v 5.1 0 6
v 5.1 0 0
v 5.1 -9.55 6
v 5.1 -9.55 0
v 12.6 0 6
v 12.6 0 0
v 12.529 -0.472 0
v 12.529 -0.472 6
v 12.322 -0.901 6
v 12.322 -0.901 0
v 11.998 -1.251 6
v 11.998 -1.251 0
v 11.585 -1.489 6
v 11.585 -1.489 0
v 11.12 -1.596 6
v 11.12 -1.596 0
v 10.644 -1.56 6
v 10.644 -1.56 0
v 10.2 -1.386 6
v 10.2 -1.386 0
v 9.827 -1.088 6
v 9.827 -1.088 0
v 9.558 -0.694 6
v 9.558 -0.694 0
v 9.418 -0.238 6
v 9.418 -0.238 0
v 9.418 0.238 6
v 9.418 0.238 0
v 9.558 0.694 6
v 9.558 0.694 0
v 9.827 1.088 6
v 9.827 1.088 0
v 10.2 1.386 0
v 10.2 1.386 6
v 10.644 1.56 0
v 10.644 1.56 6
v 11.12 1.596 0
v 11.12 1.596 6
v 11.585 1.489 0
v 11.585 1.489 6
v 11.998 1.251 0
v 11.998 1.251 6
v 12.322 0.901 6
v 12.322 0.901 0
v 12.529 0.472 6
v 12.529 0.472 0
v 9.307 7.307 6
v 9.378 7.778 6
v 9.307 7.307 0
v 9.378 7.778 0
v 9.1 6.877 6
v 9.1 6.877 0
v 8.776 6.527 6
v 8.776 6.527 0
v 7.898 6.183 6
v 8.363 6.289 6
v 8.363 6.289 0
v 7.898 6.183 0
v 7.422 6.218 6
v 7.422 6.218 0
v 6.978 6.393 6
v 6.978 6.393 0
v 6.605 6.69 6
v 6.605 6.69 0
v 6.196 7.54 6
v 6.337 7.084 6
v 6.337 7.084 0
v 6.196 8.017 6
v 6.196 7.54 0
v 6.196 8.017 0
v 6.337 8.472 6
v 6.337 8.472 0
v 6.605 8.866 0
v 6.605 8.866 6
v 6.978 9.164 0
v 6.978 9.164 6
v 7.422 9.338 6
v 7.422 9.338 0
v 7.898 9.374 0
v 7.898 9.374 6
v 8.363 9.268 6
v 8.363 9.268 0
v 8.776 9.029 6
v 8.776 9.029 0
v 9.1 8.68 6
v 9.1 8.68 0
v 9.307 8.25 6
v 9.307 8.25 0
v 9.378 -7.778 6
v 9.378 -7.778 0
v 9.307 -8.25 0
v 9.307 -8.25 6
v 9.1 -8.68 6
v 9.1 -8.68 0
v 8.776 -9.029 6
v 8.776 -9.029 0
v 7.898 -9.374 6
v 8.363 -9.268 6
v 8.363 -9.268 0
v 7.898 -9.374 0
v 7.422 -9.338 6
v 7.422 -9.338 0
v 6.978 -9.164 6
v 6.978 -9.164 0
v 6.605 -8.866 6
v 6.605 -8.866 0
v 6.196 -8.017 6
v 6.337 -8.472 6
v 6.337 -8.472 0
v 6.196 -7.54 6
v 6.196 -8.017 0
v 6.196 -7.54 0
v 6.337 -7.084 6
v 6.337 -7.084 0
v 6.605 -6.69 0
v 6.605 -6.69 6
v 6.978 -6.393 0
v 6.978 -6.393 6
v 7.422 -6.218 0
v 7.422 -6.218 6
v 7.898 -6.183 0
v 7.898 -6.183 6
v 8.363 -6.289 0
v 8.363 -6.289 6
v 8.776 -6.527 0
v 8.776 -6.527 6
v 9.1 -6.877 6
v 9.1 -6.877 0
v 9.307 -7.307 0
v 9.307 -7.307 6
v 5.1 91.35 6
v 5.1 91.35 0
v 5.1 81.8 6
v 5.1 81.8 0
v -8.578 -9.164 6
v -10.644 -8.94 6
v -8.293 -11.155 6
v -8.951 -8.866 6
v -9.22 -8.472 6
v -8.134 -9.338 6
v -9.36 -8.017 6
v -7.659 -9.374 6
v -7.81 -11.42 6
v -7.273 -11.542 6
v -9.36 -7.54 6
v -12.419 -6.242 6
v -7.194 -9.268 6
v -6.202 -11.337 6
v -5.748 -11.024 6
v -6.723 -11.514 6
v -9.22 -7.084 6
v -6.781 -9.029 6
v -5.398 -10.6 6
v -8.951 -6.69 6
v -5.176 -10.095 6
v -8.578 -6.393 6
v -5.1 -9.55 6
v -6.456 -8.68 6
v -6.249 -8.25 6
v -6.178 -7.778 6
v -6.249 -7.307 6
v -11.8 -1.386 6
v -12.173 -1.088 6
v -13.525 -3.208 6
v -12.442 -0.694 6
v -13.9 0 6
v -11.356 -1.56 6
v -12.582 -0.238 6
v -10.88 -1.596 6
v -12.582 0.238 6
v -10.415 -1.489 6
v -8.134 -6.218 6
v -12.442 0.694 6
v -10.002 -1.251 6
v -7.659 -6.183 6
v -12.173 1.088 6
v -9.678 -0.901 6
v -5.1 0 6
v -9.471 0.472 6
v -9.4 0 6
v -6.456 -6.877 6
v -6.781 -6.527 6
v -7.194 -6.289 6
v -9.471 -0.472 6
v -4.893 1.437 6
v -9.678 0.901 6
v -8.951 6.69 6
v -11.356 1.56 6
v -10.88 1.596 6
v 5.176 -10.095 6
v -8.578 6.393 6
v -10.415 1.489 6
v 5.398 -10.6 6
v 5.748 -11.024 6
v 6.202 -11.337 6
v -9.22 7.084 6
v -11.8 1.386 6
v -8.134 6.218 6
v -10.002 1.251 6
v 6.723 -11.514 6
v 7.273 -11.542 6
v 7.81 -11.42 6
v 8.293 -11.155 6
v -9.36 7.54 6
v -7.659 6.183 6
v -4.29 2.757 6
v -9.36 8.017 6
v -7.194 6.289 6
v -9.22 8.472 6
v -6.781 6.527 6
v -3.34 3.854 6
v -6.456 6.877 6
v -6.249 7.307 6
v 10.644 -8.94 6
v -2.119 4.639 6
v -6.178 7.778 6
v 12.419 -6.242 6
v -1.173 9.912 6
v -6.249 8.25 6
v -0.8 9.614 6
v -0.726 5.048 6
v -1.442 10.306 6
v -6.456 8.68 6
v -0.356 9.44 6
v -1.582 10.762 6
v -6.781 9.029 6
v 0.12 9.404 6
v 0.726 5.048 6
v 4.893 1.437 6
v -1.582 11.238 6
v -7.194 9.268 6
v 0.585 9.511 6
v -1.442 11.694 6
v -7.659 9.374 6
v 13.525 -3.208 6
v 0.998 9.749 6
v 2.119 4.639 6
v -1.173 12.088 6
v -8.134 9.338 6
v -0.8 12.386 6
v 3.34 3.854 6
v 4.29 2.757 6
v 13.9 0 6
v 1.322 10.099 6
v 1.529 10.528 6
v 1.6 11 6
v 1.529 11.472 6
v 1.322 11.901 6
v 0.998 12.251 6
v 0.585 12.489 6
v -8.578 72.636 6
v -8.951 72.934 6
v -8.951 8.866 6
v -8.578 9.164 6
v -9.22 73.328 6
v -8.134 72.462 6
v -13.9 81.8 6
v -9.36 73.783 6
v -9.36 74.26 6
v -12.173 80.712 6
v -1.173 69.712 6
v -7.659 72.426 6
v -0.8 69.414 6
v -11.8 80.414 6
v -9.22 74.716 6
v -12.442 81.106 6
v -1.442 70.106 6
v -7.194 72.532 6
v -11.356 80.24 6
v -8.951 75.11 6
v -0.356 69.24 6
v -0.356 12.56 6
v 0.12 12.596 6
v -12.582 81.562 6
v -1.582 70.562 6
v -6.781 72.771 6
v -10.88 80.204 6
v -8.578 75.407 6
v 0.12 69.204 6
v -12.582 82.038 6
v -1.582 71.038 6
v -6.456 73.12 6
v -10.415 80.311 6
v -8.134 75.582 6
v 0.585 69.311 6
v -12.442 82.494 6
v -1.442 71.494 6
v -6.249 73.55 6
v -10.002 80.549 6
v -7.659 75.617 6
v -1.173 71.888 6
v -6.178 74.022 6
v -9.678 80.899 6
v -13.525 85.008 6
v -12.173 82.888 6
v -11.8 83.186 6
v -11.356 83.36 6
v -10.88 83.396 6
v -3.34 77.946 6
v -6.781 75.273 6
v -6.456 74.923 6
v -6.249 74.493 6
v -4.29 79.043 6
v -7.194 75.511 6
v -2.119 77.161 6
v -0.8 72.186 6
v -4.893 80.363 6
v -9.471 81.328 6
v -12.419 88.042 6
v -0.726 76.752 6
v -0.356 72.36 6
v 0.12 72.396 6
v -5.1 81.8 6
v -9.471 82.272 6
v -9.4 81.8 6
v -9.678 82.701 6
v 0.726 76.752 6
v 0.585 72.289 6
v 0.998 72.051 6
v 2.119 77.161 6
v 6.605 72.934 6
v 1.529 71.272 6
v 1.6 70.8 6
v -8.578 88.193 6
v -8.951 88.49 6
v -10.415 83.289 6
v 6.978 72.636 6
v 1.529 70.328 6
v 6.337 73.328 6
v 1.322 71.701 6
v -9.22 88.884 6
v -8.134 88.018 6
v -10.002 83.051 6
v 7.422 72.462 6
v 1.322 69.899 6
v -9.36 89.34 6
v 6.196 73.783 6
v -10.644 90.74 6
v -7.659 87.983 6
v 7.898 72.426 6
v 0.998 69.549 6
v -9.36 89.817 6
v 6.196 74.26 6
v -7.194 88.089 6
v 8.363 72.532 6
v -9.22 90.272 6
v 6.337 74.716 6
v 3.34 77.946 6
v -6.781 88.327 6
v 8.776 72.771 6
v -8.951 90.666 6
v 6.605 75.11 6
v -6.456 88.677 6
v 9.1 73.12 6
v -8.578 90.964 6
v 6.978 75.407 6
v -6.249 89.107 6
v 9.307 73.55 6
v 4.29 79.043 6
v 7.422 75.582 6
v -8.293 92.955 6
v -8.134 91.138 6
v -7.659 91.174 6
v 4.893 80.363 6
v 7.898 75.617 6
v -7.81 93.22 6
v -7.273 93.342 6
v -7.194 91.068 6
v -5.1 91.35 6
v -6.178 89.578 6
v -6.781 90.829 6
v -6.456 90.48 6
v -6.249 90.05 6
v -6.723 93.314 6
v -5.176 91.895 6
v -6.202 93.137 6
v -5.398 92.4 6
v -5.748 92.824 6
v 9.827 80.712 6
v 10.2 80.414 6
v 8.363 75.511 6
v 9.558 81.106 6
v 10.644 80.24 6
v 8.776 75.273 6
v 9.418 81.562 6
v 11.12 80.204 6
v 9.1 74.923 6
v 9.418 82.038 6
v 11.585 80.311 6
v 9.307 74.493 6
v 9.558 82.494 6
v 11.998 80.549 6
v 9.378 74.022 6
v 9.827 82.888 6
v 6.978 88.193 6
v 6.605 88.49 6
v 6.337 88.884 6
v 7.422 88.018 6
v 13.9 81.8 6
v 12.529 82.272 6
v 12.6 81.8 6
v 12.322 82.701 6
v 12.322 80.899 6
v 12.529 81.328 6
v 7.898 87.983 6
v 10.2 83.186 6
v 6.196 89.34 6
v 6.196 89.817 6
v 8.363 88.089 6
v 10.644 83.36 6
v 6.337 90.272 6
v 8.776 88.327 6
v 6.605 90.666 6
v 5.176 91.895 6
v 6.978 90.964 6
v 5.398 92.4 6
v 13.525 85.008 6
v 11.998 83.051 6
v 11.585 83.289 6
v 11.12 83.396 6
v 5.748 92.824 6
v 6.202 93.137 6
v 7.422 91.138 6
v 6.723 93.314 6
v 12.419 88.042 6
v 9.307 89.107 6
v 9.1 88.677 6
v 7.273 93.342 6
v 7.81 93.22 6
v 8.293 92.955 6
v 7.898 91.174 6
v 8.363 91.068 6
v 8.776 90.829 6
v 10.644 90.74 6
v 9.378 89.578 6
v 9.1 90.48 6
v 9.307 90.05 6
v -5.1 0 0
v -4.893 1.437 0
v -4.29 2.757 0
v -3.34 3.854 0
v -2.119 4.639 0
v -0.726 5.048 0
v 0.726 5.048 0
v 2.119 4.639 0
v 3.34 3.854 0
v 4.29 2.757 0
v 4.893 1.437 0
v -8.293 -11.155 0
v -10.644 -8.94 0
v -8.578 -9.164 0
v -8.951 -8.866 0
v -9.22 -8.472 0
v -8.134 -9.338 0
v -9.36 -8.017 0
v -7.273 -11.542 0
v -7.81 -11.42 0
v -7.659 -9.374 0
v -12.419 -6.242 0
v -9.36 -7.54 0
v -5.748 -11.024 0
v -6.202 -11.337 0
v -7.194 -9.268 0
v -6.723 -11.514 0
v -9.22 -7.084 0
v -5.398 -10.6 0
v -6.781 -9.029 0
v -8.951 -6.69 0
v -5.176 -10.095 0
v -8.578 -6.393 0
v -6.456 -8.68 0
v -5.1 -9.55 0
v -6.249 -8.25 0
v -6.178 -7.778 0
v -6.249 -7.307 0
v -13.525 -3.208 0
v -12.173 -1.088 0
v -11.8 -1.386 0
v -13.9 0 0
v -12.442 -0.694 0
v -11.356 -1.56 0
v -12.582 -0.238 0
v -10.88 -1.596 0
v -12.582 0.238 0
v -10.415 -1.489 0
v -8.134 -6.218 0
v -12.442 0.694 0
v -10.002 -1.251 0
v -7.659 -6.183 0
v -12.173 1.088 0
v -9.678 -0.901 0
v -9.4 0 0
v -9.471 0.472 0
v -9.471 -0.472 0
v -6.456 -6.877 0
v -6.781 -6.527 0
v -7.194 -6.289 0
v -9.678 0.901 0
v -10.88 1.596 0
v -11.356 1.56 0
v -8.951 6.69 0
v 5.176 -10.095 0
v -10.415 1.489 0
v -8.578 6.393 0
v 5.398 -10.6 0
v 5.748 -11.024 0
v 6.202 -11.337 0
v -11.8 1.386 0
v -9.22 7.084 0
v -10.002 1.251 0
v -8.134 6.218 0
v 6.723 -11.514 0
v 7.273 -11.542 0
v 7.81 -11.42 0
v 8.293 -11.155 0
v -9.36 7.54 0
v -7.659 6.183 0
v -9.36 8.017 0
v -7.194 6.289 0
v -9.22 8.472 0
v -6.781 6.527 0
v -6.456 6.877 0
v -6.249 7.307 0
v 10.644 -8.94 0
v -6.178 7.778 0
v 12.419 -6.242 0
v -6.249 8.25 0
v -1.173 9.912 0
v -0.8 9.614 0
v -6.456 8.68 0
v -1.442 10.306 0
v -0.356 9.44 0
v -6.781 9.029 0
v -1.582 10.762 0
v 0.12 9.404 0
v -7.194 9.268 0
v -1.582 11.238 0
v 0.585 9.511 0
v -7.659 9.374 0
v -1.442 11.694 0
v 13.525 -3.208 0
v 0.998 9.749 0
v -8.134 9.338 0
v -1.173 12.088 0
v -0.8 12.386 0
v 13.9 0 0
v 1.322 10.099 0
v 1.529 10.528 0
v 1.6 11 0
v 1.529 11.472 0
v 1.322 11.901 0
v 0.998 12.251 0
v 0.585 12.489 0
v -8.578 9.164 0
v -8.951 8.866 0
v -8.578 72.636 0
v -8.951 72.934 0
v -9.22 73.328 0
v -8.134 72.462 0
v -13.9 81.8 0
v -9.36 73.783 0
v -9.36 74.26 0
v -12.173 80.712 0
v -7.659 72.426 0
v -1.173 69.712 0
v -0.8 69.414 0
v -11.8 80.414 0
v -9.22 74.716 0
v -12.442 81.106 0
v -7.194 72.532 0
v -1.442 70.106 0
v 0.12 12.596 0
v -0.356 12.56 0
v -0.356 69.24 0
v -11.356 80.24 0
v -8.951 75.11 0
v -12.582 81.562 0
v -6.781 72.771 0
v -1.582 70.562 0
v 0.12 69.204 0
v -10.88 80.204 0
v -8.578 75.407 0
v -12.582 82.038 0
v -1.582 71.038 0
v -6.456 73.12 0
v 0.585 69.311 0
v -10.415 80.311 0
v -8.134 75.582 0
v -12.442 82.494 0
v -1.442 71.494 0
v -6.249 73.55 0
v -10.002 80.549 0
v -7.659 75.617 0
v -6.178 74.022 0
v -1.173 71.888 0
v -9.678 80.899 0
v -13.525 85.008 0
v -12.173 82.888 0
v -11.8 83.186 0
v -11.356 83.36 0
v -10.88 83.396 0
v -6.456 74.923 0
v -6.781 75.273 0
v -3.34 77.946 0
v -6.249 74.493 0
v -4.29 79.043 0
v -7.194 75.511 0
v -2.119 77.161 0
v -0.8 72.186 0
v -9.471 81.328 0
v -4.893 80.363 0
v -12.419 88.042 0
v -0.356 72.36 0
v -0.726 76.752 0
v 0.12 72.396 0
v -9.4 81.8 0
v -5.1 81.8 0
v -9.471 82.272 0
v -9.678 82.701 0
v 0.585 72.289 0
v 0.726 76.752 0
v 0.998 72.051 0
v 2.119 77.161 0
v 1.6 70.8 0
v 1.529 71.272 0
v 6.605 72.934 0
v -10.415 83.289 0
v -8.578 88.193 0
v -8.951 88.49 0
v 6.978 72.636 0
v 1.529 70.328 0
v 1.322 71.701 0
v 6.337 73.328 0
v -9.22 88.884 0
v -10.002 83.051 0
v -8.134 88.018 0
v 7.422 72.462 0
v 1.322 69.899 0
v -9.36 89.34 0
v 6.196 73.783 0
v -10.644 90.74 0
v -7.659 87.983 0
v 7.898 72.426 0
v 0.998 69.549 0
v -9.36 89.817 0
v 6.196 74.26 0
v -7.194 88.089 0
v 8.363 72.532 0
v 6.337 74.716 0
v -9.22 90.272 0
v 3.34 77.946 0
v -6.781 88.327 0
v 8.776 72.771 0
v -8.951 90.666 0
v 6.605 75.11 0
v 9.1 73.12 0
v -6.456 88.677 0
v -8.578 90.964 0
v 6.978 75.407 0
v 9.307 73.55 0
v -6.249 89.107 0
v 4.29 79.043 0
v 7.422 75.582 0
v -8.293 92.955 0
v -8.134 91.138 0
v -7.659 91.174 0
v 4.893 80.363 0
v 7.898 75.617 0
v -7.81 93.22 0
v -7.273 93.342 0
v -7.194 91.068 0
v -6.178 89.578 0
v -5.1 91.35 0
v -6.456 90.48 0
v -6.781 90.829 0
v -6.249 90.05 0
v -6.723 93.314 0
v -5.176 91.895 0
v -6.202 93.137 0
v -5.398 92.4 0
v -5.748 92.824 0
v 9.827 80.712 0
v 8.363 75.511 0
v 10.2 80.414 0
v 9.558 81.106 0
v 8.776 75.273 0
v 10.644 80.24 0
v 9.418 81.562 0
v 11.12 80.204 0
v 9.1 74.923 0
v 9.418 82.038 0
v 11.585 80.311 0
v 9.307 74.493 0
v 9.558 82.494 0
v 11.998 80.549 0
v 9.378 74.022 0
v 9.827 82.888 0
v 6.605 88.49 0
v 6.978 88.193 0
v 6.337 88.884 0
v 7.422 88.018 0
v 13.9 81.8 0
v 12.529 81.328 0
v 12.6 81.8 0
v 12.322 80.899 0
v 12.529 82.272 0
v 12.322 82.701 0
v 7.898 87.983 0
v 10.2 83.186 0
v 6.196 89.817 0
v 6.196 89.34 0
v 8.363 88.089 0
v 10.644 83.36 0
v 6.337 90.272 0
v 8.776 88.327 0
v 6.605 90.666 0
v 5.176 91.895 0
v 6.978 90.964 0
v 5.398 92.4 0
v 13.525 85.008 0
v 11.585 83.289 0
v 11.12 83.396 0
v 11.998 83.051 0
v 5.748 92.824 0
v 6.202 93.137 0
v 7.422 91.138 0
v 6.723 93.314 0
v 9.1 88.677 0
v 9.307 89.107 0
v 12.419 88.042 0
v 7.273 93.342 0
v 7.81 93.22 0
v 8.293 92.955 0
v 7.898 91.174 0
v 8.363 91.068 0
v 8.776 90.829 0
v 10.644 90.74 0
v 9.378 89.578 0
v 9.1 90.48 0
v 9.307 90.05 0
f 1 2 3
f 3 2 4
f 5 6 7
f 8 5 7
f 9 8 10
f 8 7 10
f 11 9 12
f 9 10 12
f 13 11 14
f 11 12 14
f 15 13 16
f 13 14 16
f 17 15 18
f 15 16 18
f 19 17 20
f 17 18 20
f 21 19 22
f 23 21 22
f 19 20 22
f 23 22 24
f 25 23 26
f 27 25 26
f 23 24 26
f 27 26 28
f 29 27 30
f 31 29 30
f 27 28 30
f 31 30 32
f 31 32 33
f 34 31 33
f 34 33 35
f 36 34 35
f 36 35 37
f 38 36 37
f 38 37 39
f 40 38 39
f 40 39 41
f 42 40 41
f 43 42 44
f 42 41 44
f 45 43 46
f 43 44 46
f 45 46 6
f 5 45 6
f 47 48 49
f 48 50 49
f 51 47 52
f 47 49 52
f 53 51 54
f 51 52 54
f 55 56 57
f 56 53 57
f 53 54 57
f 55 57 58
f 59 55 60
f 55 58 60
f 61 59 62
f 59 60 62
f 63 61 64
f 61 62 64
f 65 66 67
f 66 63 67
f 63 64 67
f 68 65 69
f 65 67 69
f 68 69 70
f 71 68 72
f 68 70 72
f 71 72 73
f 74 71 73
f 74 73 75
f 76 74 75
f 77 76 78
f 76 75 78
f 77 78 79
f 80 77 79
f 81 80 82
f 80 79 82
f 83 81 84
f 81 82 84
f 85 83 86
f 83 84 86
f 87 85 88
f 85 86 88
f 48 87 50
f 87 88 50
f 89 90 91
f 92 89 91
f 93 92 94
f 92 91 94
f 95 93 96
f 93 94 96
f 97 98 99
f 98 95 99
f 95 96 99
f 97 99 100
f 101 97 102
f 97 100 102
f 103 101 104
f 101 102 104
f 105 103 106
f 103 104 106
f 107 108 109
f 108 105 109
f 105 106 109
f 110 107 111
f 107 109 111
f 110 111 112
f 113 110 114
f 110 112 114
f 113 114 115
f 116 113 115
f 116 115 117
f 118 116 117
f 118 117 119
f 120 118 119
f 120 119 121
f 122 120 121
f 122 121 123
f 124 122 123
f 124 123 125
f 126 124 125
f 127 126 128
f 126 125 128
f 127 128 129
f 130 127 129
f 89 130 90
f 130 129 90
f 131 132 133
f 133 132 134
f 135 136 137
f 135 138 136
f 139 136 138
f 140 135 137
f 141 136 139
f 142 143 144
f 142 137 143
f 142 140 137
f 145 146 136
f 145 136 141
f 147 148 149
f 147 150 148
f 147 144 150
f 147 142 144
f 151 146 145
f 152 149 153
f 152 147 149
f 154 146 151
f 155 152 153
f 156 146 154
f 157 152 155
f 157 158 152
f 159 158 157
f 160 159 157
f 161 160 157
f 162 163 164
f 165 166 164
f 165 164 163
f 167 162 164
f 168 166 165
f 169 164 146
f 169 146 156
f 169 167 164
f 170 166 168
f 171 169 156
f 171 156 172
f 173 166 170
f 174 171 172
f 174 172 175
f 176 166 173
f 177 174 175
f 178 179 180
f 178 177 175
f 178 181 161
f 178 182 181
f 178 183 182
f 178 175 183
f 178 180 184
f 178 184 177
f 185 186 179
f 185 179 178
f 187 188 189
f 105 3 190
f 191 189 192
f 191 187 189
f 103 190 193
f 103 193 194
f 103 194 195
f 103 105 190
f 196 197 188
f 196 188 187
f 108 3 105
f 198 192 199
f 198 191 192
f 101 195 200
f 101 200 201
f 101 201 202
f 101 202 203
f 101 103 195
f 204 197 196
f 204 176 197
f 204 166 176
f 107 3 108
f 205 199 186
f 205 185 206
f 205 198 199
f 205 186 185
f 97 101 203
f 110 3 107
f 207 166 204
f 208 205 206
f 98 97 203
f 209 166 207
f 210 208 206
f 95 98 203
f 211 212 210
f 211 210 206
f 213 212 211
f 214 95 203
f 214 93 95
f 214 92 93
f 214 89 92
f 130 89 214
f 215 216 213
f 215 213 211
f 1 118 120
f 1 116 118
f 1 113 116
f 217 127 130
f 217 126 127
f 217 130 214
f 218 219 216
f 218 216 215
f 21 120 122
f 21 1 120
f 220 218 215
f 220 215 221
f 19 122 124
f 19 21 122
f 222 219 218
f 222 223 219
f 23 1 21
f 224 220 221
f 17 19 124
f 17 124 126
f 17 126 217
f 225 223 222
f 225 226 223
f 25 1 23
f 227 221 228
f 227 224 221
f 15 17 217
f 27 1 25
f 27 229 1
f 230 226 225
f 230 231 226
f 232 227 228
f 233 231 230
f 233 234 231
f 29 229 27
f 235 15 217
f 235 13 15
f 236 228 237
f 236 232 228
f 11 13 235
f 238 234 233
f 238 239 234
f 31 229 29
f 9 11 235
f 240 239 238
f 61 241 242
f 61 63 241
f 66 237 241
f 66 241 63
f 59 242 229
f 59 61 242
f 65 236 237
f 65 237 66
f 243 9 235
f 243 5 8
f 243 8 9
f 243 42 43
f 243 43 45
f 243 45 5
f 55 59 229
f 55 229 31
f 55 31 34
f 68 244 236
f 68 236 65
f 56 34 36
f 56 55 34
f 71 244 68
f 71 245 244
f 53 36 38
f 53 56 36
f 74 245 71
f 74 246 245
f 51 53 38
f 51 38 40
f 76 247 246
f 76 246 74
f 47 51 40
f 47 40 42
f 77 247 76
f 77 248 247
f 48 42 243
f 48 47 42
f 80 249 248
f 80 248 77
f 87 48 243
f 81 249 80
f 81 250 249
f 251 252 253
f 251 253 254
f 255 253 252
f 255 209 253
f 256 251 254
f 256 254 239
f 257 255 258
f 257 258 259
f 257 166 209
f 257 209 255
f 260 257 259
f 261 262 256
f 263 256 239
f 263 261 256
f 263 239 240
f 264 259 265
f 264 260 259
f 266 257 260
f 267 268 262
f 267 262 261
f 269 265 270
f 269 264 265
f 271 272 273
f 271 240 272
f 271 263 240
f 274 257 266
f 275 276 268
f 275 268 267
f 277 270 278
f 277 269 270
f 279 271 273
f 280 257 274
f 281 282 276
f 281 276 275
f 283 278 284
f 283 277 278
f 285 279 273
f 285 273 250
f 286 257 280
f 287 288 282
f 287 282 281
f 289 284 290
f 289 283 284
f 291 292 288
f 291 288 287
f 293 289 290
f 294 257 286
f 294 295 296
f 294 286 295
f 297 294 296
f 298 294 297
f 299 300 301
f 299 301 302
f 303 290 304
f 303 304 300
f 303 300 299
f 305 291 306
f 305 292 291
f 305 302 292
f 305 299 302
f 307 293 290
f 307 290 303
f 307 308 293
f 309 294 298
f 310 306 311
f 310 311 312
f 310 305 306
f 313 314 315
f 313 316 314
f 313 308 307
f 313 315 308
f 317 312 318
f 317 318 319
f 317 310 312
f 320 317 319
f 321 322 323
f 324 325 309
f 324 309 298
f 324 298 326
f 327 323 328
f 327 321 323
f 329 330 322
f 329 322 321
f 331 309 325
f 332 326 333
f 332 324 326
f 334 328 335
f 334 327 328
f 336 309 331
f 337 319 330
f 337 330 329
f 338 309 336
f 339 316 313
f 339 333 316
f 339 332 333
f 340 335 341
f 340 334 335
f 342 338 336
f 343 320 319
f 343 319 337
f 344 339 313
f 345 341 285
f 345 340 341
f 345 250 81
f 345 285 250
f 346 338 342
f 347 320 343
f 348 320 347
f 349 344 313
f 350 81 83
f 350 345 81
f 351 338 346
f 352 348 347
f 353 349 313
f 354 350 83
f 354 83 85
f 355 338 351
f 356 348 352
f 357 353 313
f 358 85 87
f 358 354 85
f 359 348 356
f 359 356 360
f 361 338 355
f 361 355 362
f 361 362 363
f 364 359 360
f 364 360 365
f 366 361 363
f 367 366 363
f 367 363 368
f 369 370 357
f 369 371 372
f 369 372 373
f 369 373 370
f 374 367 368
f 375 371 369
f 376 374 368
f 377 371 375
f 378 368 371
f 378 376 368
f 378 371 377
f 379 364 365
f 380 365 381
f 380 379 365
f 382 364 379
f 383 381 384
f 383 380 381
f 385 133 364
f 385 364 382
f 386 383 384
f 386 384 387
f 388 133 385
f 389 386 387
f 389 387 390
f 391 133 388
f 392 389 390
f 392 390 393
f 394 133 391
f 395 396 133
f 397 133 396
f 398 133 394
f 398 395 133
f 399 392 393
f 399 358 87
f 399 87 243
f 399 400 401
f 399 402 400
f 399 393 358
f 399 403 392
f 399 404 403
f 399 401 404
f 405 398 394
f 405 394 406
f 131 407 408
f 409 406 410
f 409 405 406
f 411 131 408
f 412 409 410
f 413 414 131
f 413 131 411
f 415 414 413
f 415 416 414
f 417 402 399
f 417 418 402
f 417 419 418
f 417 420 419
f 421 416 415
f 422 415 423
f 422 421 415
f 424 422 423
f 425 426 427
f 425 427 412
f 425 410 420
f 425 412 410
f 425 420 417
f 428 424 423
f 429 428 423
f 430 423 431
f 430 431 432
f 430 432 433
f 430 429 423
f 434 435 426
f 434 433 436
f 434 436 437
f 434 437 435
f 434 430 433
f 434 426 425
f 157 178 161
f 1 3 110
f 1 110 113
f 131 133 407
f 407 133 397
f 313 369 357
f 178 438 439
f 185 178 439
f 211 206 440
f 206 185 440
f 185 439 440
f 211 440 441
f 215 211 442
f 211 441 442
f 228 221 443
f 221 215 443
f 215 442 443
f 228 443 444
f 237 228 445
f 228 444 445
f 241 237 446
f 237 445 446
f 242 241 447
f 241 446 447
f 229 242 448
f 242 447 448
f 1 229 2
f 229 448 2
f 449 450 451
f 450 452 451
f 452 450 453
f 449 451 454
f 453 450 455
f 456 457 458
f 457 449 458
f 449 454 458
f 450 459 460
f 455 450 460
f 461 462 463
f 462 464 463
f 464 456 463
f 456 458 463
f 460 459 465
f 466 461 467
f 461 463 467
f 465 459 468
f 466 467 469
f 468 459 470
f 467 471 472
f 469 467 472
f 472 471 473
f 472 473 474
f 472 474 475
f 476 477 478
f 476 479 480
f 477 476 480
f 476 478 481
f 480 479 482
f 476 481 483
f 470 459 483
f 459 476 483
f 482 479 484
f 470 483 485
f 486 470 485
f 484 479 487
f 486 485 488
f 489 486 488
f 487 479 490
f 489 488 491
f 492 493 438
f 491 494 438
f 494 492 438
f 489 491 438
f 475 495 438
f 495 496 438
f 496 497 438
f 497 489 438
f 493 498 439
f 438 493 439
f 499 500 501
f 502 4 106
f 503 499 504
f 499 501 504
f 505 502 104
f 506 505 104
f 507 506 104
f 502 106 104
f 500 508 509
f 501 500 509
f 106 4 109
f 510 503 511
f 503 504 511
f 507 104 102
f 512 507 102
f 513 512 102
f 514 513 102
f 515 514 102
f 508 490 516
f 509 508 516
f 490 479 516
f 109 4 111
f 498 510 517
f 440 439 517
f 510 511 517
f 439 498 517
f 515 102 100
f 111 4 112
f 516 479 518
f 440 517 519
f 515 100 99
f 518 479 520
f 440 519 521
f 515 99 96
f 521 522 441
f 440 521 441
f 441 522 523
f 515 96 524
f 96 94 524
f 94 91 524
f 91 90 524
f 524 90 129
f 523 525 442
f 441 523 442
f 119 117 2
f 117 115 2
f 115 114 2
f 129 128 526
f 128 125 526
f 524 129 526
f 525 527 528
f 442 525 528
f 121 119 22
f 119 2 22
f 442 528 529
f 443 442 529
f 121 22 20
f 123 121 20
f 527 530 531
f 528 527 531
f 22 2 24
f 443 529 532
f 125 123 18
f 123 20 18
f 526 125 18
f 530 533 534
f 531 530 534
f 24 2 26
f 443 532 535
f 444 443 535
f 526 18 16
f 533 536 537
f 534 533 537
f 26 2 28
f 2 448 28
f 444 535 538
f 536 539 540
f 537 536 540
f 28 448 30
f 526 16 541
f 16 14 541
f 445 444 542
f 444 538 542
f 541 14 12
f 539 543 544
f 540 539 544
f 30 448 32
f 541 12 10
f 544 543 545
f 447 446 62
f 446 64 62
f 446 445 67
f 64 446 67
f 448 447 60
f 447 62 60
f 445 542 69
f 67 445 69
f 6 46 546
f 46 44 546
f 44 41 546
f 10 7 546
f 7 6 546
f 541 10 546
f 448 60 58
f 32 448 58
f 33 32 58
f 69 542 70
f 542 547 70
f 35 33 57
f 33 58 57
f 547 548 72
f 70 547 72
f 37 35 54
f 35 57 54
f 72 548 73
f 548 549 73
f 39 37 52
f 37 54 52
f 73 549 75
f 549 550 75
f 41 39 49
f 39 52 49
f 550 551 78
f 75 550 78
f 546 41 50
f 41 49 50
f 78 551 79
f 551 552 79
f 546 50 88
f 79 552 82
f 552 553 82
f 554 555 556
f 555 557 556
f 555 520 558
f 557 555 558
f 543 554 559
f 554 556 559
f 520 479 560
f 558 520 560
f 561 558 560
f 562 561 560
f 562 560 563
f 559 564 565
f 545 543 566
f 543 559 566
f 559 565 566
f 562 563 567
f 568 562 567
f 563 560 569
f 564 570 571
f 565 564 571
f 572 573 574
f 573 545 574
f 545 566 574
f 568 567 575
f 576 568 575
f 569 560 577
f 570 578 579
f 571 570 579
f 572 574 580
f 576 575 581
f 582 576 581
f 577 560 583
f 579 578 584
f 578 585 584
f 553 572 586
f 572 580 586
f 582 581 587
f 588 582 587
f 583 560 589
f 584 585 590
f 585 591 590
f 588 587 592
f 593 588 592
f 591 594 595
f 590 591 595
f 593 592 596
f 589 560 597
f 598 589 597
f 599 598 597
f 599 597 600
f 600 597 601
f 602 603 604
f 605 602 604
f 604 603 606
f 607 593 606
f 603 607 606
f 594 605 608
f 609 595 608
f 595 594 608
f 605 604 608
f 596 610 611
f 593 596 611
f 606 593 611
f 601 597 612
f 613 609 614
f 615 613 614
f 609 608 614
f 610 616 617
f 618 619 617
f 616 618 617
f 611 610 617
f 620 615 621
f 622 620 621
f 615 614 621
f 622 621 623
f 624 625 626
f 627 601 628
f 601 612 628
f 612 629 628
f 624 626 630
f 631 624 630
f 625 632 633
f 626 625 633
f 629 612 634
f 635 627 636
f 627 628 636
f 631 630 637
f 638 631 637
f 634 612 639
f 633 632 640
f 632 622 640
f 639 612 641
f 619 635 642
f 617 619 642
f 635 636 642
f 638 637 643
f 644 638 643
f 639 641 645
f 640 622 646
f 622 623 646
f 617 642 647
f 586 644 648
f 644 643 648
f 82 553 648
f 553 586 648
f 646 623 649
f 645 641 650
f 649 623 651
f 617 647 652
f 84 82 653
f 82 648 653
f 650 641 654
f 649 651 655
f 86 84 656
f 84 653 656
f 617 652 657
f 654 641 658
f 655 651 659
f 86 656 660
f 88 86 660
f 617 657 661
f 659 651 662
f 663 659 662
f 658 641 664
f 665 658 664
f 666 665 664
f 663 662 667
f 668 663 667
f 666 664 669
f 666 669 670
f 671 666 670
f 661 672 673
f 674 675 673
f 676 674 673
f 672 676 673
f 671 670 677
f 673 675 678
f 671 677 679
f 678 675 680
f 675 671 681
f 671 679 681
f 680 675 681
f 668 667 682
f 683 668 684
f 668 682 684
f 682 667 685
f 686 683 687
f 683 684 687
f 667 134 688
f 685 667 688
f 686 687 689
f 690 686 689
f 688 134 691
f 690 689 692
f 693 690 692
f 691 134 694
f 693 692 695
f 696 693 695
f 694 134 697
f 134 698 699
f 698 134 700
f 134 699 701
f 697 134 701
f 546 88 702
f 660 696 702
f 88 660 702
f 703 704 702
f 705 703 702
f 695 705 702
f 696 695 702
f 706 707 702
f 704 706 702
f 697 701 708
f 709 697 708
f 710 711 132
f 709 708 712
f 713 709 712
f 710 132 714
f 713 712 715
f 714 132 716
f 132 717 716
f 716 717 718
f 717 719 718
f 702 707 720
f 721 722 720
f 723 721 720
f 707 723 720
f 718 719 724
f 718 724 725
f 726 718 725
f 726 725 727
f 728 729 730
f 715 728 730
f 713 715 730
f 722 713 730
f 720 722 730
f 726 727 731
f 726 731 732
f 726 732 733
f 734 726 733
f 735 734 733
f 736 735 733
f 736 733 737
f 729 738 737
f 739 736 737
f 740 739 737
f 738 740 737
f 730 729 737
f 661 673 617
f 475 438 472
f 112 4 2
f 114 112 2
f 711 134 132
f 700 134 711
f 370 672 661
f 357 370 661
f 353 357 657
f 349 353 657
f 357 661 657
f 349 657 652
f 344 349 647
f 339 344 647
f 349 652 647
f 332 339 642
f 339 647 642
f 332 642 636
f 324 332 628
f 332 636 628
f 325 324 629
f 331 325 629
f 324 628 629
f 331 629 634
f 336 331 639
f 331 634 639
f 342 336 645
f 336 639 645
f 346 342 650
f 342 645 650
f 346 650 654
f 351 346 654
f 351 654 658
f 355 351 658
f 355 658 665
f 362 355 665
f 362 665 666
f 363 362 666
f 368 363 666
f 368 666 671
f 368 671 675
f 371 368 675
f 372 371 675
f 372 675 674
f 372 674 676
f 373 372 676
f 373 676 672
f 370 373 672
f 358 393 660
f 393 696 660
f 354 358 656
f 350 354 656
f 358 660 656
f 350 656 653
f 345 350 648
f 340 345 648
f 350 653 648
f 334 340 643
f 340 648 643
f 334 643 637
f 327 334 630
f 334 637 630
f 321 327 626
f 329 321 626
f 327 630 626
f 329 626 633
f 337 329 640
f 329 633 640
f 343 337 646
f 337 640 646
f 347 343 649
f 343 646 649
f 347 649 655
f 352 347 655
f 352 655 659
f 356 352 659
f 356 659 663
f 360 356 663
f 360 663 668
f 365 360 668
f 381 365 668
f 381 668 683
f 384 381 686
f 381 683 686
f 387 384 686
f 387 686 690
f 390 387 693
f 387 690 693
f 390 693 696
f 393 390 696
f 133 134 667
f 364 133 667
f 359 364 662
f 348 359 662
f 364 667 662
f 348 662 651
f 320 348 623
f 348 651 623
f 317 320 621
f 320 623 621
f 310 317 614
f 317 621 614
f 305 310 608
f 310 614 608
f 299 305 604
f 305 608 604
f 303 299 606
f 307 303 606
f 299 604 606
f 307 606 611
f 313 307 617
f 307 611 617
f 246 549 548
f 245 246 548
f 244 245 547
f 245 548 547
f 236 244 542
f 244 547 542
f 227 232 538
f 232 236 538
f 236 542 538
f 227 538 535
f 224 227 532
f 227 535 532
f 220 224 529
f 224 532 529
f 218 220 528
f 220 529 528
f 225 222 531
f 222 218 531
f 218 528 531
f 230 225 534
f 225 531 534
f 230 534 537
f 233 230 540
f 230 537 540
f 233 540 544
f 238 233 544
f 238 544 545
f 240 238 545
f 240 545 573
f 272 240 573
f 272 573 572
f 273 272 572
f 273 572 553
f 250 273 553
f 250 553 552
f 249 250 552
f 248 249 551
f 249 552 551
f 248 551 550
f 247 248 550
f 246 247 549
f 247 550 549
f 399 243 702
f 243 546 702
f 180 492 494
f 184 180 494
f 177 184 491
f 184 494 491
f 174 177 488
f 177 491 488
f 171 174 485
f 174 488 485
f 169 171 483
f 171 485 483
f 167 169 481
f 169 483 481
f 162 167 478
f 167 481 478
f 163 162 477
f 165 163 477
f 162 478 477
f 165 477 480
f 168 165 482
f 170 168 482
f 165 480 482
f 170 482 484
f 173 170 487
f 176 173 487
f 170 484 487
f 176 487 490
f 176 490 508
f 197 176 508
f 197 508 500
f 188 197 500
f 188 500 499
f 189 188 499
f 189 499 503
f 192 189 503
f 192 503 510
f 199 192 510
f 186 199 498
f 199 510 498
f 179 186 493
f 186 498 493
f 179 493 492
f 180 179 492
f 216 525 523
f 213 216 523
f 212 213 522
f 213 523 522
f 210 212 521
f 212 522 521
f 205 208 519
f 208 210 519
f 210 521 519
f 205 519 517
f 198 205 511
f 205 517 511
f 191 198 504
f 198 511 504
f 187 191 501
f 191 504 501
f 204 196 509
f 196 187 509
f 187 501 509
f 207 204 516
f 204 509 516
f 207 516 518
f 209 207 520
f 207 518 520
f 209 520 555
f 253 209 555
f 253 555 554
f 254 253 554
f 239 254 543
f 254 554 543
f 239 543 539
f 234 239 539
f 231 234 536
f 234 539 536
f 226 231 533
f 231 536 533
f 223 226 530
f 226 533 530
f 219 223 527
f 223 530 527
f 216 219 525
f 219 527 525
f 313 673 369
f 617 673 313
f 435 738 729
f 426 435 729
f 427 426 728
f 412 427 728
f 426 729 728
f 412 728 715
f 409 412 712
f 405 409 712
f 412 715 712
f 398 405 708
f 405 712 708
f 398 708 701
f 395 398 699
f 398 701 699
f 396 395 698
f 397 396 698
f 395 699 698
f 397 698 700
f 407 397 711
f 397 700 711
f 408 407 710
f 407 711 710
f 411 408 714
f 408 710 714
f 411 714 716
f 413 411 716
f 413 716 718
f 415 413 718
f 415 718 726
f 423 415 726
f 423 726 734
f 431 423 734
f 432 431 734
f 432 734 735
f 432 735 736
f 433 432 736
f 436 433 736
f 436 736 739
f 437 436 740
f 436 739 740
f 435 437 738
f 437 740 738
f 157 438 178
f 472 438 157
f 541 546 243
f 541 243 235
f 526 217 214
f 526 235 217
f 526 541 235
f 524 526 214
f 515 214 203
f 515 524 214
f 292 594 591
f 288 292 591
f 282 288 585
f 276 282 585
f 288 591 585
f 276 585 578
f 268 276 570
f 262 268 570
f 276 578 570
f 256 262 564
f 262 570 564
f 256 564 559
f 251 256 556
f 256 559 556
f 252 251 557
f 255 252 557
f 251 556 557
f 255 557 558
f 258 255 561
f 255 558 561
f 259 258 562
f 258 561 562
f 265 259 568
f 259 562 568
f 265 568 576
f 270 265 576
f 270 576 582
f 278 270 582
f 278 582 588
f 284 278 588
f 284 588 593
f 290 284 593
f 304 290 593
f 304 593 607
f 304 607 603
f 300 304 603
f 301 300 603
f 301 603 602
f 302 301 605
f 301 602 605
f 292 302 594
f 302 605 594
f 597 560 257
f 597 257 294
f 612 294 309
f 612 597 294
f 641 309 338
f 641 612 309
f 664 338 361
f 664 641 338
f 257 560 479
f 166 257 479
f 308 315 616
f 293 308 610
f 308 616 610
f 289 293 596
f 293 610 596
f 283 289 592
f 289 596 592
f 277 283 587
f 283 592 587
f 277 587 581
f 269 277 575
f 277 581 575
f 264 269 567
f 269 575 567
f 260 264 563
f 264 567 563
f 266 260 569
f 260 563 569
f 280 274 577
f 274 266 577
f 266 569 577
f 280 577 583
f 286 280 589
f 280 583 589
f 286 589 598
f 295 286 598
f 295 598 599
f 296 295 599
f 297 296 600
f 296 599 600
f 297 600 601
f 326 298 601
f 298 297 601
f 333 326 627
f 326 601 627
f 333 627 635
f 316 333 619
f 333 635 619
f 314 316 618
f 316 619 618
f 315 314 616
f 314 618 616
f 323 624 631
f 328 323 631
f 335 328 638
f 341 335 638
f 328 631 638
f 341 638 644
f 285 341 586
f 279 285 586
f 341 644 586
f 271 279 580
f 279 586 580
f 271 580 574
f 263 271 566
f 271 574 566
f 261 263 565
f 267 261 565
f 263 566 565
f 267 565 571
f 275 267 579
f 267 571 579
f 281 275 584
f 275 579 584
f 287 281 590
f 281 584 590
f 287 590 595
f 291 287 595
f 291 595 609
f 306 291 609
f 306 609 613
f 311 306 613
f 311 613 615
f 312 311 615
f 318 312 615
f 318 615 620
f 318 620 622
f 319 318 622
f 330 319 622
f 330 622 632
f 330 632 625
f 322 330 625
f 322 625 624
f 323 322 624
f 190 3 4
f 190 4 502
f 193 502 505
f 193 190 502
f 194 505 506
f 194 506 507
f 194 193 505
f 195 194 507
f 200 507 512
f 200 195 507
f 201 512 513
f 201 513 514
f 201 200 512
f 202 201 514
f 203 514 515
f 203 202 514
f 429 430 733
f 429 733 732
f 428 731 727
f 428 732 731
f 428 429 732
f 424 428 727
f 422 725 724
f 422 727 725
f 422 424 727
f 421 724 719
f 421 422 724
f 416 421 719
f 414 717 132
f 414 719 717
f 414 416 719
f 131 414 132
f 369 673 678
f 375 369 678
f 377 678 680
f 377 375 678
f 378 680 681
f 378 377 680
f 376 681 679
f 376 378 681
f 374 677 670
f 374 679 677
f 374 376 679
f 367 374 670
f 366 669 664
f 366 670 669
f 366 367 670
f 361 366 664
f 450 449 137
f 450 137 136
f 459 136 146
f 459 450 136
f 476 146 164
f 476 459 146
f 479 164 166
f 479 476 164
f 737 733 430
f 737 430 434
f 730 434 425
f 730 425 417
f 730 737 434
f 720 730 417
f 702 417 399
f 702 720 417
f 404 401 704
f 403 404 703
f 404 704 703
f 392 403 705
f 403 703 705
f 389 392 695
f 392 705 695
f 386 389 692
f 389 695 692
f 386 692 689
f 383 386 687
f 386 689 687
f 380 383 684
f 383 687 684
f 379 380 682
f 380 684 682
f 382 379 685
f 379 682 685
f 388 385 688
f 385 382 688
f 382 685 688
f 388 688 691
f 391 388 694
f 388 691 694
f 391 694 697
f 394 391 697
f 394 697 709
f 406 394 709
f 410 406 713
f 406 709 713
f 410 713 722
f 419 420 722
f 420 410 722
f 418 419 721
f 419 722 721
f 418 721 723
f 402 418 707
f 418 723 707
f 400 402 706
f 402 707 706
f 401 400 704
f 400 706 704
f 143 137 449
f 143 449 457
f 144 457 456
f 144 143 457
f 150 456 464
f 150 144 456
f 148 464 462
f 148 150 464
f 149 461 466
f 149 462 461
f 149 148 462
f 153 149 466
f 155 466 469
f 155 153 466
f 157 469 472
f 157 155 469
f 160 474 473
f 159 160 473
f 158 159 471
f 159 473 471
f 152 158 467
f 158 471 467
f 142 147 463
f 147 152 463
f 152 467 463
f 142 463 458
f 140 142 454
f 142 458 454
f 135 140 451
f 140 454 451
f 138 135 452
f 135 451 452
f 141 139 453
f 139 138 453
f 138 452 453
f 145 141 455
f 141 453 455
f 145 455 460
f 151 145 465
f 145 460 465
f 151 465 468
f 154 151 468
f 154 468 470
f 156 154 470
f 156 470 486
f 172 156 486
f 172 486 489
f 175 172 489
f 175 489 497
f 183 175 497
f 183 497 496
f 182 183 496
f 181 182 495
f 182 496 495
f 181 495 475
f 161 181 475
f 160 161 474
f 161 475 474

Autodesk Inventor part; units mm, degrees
ref_plane "YZ Plane" through (0, 0, 0) normal (1, 0, 0) x (0, 1, 0)
ref_plane "XZ Plane" through (0, 0, 0) normal (0, 1, 0) x (-1, 0, 0)
ref_plane "XY Plane" through (0, 0, 0) normal (0, 0, 1) x (1, 0, 0)
ref_plane "작업 평면1" through (0, 0, 0) normal (0, 0, 1) x (1, 0, 0)
sketch "스케치1" plane through (0, 0, 0) normal (0, 0, 1) x (1, 0, 0)
  circle A0 centre (-7.7782, -7.7782) radius 1.55 projected
  circle A1 centre (7.7782, -7.7782) radius 1.55 projected
  circle A2 centre (7.7782, 7.7782) radius 1.55 projected
  circle A3 centre (-7.7782, 7.7782) radius 1.55 projected
  circle A4 centre (0, 0) radius 5 projected
  circle A5 centre (0, 11) radius 1.55 projected
  circle A6 centre (11, 0) radius 1.55 projected
  circle A7 centre (0, -11) radius 1.55 projected
  circle A8 centre (-11, 0) radius 1.55 projected
  circle A9 centre (0, 0) radius 5.1
  line L0 (-13.9, 0) -> (13.9, 0)
  line L1 (13.9, 0) -> (13.9, 13.9)
  line L2 (13.9, 13.9) -> (-13.9, 13.9)
  line L3 (-13.9, 13.9) -> (-13.9, 0)
  line L4 (-5.1, 0) -> (-5.1, -12.9306)
  line L5 (5.1, 0) -> (5.1, -12.9306)
  circle A10 centre (-7.7782, 7.7782) radius 1.6
  circle A11 centre (-11, 0) radius 1.6
  circle A12 centre (-7.7782, -7.7782) radius 1.6
  circle A13 centre (0, -11) radius 1.6
  circle A14 centre (7.7782, -7.7782) radius 1.6
  circle A15 centre (11, 0) radius 1.6
  circle A16 centre (7.7782, 7.7782) radius 1.6
  circle A17 centre (0, 11) radius 1.6
  line L6 (-13.9, 13.9) -> (13.9, 13.9)
  circle A18 centre (-7.7782, -7.7782) radius 1.55 projected
  circle A19 centre (7.7782, -7.7782) radius 1.55 projected
  circle A20 centre (7.7782, 7.7782) radius 1.55 projected
  circle A21 centre (-7.7782, 7.7782) radius 1.55 projected
  circle A22 centre (0, 0) radius 5 projected
  circle A23 centre (0, 0) radius 13.9 projected
  circle A24 centre (0, 11) radius 1.55 projected
  circle A25 centre (11, 0) radius 1.55 projected
  circle A26 centre (0, -11) radius 1.55 projected
  circle A27 centre (-11, 0) radius 1.55 projected
  circle A28 centre (0, 0) radius 13.9
  line L7 (-13.9, 13.9) -> (13.9, 13.9)
  line L8 (13.9, 13.9) -> (13.9, 40.9)
  line L9 (13.9, 40.9) -> (-13.9, 40.9)
  line L10 (-13.9, 40.9) -> (-13.9, 13.9)
  dimension "d0" = 0.1
  dimension "d1" = 3.2
  dimension "d4" = 360
  dimension "d10" = 27
  dimension "d16" = 13.9
extrude "돌출4" add sketch "스케치1" along normal blind 6 contours A9 L0 A11 A23 A15 | L0 A15 A23 L5 | L4 A23 L0 A11 | A23 L2 L1 | L3 L2 A23 | L2 L10 L9 L8
mirror "미러4" about plane through (13.9, 40.9, 0) normal (0, 1, 0)
fillet "모깎기3" radius 2 4 edges at (5.1, 94.7306, 3) (-5.1, 94.7306, 3) (5.1, -12.9306, 3) (-5.1, -12.9306, 3)
properties part number "leg_ver2_new" material "PMMA 플라스틱"
